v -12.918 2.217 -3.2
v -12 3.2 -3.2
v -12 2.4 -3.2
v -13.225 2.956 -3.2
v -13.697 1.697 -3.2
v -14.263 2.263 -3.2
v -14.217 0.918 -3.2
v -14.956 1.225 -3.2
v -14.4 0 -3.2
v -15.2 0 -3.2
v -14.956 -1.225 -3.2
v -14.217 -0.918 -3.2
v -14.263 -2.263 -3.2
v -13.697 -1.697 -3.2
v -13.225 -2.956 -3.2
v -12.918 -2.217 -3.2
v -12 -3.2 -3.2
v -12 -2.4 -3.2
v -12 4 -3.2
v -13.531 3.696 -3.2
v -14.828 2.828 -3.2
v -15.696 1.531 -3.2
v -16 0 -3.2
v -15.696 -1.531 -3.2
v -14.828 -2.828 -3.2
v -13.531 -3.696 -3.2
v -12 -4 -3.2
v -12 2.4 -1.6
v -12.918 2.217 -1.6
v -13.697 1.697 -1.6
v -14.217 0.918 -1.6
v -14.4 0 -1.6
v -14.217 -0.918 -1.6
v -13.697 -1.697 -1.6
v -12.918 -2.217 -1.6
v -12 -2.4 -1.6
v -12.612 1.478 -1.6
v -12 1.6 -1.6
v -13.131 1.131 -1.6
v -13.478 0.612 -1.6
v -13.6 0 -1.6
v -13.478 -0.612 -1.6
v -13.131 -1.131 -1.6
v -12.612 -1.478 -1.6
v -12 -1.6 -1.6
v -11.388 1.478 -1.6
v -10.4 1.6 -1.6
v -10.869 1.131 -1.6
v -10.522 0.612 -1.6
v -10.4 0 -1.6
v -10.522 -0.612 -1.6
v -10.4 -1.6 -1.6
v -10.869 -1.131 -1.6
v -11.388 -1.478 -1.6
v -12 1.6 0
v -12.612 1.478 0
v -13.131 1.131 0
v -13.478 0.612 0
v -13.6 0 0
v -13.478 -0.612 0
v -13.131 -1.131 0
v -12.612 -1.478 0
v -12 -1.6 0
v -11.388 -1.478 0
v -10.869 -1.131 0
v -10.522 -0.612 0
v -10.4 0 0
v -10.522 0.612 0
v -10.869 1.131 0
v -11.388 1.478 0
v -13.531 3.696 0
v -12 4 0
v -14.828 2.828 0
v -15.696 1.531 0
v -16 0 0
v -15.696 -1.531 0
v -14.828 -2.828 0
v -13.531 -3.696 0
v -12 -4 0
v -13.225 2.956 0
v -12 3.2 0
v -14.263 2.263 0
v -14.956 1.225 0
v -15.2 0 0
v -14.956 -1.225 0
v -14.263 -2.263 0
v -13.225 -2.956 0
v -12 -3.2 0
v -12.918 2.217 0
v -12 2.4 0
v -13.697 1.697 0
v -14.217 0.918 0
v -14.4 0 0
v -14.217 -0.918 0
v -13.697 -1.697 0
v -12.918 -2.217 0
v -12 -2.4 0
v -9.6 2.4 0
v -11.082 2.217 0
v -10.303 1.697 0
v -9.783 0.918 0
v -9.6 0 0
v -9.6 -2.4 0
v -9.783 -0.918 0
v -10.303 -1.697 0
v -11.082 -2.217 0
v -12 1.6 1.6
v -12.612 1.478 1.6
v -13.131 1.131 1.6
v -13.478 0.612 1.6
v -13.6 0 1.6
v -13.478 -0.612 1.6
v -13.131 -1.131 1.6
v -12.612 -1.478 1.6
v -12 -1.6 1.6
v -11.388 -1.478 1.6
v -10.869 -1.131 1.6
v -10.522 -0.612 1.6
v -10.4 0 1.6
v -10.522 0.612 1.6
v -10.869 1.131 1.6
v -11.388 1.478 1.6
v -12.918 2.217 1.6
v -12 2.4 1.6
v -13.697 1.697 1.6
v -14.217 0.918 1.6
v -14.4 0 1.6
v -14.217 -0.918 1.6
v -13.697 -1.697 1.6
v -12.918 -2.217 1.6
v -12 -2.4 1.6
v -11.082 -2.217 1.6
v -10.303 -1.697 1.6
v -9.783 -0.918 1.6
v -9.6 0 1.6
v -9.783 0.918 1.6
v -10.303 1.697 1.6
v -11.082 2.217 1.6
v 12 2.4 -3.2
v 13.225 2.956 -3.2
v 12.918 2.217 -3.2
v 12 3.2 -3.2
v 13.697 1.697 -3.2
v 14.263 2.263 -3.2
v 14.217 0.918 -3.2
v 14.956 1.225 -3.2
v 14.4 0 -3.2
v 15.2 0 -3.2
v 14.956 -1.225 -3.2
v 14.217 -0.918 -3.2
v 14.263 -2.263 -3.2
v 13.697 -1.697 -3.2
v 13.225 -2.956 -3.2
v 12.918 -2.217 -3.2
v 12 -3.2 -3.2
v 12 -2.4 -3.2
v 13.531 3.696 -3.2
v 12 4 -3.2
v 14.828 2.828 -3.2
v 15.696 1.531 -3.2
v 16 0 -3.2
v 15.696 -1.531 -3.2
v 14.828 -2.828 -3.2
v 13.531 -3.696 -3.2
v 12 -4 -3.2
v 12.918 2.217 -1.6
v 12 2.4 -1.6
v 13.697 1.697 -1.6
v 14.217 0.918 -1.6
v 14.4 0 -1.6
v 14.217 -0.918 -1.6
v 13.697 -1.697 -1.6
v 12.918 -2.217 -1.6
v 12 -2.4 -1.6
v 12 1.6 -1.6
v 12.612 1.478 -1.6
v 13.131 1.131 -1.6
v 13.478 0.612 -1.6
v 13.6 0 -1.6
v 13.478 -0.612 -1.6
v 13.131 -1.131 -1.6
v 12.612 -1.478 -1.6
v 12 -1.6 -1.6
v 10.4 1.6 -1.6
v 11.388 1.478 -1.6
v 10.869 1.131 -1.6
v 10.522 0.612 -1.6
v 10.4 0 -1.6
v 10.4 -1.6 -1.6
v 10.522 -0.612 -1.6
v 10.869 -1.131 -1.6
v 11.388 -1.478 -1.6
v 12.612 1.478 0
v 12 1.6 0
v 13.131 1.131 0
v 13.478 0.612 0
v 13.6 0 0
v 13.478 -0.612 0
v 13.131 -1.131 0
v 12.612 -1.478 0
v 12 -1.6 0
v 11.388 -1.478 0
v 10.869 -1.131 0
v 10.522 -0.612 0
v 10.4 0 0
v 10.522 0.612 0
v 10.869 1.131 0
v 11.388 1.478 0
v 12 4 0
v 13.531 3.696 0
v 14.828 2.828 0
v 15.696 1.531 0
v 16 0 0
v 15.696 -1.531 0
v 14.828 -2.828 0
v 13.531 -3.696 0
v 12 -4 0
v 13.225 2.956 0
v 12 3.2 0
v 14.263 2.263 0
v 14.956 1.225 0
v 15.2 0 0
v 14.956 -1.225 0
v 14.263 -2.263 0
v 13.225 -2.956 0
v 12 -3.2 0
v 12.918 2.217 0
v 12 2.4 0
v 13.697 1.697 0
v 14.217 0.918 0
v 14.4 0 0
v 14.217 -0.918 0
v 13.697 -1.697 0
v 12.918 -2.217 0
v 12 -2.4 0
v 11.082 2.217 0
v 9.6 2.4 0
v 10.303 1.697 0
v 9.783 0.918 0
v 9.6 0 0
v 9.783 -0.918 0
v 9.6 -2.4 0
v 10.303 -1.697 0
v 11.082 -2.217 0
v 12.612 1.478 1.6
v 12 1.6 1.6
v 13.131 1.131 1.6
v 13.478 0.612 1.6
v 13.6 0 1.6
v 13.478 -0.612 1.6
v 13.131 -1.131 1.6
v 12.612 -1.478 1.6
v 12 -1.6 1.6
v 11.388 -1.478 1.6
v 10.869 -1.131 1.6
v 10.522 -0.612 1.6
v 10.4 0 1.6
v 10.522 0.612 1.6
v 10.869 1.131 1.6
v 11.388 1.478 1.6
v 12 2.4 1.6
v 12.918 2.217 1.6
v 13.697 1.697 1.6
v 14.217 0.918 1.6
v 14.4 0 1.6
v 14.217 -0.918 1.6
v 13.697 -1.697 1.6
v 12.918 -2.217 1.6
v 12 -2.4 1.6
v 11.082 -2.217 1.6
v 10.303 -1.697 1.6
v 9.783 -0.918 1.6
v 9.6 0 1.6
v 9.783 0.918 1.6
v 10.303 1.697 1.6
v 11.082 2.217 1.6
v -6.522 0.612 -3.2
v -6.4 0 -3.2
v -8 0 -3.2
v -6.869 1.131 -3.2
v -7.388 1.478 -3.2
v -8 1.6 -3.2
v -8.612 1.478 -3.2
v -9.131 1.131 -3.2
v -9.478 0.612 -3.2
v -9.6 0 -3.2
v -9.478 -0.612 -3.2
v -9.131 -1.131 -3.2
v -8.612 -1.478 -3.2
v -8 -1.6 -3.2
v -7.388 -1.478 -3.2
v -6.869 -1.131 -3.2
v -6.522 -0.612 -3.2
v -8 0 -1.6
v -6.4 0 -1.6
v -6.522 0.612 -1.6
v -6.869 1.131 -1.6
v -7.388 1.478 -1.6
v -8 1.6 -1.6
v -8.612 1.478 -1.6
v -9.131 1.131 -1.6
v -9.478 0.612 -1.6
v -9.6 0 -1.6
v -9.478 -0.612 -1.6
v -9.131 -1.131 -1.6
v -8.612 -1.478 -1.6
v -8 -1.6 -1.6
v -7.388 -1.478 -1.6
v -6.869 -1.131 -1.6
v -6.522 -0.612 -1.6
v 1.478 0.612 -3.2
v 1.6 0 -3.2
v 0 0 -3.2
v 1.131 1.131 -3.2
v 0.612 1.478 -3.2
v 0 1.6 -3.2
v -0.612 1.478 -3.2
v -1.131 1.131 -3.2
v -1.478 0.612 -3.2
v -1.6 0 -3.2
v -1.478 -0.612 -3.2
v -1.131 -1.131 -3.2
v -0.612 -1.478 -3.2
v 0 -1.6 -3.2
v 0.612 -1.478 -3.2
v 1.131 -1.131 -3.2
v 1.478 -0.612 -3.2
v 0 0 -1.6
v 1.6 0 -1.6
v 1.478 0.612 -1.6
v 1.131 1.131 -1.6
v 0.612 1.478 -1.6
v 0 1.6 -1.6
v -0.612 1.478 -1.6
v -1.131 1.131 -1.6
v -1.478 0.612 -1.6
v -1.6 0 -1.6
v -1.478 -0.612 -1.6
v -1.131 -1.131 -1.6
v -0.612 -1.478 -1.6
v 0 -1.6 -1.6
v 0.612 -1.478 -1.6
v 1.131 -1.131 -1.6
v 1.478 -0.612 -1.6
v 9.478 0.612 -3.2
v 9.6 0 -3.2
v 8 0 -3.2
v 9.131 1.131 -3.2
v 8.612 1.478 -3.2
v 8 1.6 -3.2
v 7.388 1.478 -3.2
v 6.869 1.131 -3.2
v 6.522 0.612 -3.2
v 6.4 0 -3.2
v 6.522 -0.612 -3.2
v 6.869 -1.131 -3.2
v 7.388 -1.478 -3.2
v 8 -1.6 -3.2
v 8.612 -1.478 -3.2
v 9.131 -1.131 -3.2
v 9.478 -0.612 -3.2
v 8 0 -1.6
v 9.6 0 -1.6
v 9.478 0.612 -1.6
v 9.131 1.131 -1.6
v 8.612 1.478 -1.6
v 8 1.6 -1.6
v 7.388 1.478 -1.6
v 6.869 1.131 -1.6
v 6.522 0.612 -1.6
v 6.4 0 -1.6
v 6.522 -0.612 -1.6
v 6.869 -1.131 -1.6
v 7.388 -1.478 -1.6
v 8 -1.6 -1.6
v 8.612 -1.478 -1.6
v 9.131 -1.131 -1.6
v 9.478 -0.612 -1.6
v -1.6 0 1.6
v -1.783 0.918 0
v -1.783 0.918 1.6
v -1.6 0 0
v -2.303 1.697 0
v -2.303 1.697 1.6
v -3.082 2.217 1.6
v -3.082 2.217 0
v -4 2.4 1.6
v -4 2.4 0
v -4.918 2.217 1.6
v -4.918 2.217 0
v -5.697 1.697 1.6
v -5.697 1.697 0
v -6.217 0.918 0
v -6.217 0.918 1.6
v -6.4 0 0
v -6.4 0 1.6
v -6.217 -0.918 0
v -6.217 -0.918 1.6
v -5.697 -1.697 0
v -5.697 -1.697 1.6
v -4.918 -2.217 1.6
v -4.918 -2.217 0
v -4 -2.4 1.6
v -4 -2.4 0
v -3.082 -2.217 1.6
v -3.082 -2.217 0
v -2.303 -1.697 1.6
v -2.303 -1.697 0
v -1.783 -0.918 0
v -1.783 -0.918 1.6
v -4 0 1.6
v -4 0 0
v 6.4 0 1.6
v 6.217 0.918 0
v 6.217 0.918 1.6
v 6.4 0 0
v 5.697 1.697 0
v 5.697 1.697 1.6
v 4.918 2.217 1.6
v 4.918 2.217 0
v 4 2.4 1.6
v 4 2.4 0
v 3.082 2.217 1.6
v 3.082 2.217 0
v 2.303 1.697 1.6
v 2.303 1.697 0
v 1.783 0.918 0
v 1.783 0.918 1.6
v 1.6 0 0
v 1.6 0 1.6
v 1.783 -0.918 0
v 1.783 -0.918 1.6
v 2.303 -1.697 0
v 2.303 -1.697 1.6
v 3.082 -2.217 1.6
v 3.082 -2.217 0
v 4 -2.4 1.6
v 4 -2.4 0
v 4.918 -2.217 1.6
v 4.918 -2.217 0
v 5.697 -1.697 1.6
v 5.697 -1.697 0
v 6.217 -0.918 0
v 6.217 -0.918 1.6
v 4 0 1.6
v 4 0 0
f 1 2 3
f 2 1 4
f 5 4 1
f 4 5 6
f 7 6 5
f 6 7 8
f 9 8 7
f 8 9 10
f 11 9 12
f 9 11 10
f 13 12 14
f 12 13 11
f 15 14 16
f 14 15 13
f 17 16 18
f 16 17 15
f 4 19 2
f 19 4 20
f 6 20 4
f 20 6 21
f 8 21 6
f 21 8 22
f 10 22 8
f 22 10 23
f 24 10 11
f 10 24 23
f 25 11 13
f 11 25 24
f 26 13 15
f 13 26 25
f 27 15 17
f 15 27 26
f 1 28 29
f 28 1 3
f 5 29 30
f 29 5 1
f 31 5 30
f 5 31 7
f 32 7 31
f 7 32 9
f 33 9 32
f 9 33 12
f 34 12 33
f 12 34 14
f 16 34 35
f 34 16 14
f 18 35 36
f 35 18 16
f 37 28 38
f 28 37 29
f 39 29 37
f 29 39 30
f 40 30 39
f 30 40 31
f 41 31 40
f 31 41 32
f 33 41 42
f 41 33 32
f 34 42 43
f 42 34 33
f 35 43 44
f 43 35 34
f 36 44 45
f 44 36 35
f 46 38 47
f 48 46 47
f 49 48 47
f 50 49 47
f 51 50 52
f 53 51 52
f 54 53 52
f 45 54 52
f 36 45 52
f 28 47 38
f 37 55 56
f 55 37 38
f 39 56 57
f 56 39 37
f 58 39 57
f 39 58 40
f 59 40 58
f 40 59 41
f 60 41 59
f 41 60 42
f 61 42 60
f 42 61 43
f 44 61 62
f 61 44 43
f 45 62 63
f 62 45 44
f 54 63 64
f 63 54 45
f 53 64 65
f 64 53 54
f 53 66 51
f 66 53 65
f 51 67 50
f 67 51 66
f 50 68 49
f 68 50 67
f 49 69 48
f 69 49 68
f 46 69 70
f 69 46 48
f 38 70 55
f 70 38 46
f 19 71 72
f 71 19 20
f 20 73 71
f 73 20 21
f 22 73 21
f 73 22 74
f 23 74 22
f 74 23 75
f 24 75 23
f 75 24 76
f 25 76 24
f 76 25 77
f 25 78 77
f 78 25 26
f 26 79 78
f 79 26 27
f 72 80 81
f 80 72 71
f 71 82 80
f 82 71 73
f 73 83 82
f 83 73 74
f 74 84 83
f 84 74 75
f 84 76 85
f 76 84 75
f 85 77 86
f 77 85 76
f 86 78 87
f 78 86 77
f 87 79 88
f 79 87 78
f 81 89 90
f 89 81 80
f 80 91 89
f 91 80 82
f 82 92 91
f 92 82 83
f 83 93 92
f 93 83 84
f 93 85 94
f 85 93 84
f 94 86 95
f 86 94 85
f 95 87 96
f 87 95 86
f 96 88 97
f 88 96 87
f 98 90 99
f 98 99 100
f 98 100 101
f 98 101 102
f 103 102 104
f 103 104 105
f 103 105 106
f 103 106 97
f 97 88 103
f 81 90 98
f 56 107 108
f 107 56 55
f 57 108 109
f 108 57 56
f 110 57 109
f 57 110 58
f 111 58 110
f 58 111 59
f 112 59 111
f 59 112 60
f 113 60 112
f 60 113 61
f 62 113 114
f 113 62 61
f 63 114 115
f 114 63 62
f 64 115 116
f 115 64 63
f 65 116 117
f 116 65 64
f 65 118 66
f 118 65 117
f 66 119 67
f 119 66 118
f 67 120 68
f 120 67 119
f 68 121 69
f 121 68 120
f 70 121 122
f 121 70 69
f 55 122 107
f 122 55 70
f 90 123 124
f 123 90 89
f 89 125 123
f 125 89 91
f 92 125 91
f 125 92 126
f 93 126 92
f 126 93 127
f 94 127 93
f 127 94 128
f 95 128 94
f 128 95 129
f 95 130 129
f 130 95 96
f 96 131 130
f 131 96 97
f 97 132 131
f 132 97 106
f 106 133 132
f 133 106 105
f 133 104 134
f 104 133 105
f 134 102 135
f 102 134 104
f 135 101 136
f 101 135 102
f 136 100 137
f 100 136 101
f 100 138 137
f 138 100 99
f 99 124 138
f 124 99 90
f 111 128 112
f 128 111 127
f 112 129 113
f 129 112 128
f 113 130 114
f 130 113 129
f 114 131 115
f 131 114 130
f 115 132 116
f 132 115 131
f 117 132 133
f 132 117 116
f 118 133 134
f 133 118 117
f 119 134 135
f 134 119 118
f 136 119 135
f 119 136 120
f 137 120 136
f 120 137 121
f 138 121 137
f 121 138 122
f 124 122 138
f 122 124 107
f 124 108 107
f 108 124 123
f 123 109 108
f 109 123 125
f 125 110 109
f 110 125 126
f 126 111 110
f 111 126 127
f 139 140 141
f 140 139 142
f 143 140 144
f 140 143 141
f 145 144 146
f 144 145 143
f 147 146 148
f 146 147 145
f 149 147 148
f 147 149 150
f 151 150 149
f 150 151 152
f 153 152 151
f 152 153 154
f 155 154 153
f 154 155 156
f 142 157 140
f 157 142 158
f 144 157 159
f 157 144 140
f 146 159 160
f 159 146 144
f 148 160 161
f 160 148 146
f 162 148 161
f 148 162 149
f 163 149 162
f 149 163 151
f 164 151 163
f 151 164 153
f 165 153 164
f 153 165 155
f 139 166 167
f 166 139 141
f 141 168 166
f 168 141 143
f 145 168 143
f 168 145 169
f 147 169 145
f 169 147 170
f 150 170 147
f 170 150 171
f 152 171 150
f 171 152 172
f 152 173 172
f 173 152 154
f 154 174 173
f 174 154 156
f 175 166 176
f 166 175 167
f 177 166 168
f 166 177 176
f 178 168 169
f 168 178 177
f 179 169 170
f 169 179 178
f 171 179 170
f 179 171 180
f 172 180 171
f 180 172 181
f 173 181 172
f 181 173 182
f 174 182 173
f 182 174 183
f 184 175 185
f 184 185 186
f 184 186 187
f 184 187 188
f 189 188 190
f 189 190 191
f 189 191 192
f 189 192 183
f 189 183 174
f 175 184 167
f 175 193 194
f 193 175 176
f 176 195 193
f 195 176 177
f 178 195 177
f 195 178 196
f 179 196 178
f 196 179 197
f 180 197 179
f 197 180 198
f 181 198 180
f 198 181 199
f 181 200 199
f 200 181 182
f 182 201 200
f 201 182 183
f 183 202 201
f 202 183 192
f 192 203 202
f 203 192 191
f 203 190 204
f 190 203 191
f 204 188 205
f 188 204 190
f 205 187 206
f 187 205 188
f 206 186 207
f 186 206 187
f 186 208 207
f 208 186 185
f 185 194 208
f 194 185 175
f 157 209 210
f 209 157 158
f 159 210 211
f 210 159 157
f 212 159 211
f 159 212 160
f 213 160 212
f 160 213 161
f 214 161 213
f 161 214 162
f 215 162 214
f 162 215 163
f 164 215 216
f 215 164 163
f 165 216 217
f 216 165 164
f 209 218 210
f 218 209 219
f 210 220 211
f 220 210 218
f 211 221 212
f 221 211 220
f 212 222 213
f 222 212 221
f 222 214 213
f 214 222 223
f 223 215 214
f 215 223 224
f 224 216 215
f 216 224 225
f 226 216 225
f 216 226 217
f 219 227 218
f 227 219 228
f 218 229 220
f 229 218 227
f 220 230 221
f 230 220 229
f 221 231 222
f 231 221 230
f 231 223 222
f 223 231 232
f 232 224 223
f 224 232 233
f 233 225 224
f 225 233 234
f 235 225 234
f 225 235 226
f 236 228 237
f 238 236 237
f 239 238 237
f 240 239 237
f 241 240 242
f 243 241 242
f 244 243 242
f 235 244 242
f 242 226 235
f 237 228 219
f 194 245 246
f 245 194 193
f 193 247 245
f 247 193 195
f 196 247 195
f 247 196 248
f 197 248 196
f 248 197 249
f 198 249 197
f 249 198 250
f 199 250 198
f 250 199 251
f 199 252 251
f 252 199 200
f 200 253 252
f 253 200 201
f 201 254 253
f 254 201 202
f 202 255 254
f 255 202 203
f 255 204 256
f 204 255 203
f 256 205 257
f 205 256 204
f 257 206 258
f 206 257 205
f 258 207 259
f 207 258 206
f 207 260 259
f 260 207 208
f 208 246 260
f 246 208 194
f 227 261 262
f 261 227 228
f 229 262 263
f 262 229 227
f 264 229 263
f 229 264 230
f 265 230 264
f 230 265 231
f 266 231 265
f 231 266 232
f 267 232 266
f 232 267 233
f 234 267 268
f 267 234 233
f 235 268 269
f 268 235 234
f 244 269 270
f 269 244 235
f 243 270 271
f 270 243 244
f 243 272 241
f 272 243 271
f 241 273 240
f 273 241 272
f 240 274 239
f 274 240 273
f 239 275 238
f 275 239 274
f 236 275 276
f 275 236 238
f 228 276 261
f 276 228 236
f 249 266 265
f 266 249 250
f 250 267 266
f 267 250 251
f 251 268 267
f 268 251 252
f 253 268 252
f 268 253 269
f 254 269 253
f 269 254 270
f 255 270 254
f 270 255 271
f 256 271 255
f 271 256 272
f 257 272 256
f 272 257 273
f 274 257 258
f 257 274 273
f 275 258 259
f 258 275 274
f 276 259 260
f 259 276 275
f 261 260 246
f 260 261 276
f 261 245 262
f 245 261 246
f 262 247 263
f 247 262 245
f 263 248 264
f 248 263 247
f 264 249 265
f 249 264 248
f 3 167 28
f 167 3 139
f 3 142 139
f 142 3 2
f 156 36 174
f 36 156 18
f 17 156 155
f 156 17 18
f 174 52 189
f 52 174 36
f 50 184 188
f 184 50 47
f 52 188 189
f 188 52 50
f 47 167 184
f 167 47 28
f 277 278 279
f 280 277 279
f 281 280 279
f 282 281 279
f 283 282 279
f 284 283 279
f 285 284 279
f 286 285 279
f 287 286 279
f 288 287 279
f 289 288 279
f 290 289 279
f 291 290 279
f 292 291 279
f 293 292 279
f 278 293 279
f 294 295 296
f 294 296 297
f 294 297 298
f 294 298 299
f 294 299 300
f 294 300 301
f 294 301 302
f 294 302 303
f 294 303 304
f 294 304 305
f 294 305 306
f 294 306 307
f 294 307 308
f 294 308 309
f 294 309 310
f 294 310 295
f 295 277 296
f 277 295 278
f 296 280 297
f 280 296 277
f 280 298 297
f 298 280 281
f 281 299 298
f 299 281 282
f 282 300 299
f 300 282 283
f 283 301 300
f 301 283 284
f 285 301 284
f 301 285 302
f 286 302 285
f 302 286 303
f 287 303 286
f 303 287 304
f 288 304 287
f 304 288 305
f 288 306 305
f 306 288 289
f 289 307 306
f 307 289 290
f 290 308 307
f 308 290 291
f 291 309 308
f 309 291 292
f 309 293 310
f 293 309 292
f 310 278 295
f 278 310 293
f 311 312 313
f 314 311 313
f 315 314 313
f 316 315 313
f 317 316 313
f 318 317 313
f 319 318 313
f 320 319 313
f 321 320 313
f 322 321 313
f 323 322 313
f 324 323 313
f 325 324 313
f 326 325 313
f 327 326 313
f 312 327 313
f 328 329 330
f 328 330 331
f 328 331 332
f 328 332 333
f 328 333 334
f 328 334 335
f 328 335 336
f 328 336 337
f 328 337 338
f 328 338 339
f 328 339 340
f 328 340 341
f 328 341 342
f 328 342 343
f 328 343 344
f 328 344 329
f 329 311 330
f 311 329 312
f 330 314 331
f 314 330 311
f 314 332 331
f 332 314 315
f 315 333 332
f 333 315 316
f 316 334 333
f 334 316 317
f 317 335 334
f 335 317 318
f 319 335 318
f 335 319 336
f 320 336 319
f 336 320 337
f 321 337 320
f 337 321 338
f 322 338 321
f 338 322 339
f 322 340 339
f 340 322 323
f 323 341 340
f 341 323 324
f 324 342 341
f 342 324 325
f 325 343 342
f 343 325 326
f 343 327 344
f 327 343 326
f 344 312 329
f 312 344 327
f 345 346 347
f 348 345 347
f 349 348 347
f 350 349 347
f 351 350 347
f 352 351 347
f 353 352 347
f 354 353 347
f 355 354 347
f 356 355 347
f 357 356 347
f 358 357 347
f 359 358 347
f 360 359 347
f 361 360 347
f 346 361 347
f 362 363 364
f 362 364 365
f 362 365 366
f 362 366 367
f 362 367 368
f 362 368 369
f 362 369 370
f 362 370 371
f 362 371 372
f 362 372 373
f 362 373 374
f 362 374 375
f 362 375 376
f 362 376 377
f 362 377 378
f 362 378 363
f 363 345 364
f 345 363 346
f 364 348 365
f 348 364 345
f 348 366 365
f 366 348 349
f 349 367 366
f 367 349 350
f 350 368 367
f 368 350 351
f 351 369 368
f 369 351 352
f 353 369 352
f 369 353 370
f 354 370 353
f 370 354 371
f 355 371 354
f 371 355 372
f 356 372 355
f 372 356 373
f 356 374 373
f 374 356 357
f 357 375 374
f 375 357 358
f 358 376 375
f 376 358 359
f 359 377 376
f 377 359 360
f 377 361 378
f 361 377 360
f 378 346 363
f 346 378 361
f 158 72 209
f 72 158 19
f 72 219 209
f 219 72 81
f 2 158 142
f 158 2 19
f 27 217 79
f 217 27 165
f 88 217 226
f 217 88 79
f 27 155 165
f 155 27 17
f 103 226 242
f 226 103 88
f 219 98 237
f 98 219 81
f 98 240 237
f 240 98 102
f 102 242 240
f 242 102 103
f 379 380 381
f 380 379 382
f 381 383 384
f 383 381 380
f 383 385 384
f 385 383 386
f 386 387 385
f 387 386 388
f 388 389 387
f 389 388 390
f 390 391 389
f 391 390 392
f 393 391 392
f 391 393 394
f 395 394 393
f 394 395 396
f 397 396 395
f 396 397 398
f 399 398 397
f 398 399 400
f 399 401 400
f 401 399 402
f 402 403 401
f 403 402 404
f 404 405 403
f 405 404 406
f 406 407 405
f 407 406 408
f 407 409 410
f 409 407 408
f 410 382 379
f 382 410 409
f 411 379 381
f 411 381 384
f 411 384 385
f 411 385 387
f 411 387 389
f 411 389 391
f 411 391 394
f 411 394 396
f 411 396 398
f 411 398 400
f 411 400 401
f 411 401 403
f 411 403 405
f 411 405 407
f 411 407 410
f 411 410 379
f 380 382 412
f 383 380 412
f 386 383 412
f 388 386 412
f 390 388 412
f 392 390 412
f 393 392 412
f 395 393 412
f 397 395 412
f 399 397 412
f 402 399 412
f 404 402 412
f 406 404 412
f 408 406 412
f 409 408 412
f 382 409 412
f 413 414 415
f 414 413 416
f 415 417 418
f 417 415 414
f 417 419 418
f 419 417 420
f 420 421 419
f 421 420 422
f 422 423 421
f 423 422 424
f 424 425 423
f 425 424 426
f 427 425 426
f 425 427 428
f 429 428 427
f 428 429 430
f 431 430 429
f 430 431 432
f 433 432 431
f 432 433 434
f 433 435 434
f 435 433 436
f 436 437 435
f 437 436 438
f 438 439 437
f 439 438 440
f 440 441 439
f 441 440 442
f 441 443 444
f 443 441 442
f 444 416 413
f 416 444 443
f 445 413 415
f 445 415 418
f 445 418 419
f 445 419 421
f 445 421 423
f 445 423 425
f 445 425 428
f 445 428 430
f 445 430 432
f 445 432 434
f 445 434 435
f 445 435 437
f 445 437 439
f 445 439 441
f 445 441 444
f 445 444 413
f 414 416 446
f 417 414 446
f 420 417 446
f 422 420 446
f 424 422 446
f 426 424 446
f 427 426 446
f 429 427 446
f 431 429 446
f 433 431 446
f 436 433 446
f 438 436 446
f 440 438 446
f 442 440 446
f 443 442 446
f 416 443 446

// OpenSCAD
use <../lib.scad>
use <../p/box2-11.scad>
use <../p/box3u10p.scad>
use <s/77850s01.scad>
use <../p/stug-1x2.scad>
use <../p/stug3-1x3.scad>
function ldraw_lib__77845() = [
// 0 Plate  1 x  4 Round Ends with  2 Open Studs on Ends
// 0 Name: 77845.dat
// 0 Author: Gerald Lasser [GeraldLasser]
// 0 !LDRAW_ORG Part UPDATE 2023-05
// 0 !LICENSE Licensed under CC BY 4.0 : see CAreadme.txt
// 
// 0 BFC CERTIFY CCW
  [0,"BFC","CERTIFY"],
  [0,"BFC","CCW"],
// 
// 0 !HISTORY 2023-10-31 [OrionP] Official Update 2023-05
// 
// 
// 1 16 -30 0 0 1 0 0 0 1 0 0 0 1 s\77850s01.dat
  [1,16,-30,0,0,1,0,0,0,1,0,0,0,1, ldraw_lib__s__77850s01()],
// 1 16 30 0 0 -1 0 0 0 1 0 0 0 1 s\77850s01.dat
  [1,16,30,0,0,-1,0,0,0,1,0,0,0,1, ldraw_lib__s__77850s01()],
// 
// 0 // Bottom
// 1 16 0 6 7 30 0 0 0 0 2 0 -1 0 box2-11.dat
  [1,16,0,6,7,30,0,0,0,0,2,0,-1,0, ldraw_lib__box2_11()],
// 1 16 0 6 -7 -30 0 0 0 0 2 0 1 0 box2-11.dat
  [1,16,0,6,-7,-30,0,0,0,0,2,0,1,0, ldraw_lib__box2_11()],
// 2 24 30 4 -6 -30 4 -6
  [2,24,30,4,-6,-30,4,-6],
// 2 24 -30 4 6 30 4 6
  [2,24,-30,4,6,30,4,6],
// 
// 4 16 26 4 -4 30 4 -6 -30 4 -6 -26 4 -4
  [4,16,26,4,-4,30,4,-6,-30,4,-6,-26,4,-4],
// 4 16 -26 4 4 26 4 4 26 4 0 -26 4 0
  [4,16,-26,4,4,26,4,4,26,4,0,-26,4,0],
// 4 16 -26 4 -4 -26 4 0 26 4 0 26 4 -4
  [4,16,-26,4,-4,-26,4,0,26,4,0,26,4,-4],
// 4 16 26 4 4 -26 4 4 -30 4 6 30 4 6
  [4,16,26,4,4,-26,4,4,-30,4,6,30,4,6],
// 1 16 0 4 0 1 0 0 0 -1 0 0 0 1 stug3-1x3.dat
  [1,16,0,4,0,1,0,0,0,-1,0,0,0,1, ldraw_lib__stug3_1x3()],
// 
// 1 16 0 4 8 30 0 0 0 0 -4 0 2 0 box3u10p.dat
  [1,16,0,4,8,30,0,0,0,0,-4,0,2,0, ldraw_lib__box3u10p()],
// 1 16 0 4 -8 -30 0 0 0 0 -4 0 -2 0 box3u10p.dat
  [1,16,0,4,-8,-30,0,0,0,0,-4,0,-2,0, ldraw_lib__box3u10p()],
// 
// 0 // Top
// 4 16 -30 0 -8 30 0 -8 24 0 -6 -24 0 -6
  [4,16,-30,0,-8,30,0,-8,24,0,-6,-24,0,-6],
// 4 16 24 0 6 30 0 8 -30 0 8 -24 0 6
  [4,16,24,0,6,30,0,8,-30,0,8,-24,0,6],
// 4 16 -24 0 6 -24 0 0 24 0 0 24 0 6
  [4,16,-24,0,6,-24,0,0,24,0,0,24,0,6],
// 4 16 -24 0 0 -24 0 -6 24 0 -6 24 0 0
  [4,16,-24,0,0,-24,0,-6,24,0,-6,24,0,0],
// 1 16 0 0 0 1 0 0 0 1 0 0 0 1 stug-1x2.dat
  [1,16,0,0,0,1,0,0,0,1,0,0,0,1, ldraw_lib__stug_1x2()],
];
module ldraw_lib__77845(step=0, col=false, unit=2/5, alt=false, line=0.2, solid=!$preview)
    makepoly(ldraw_lib__77845(), step=step, col=col, unit=unit, alt=alt, line=line, solid=solid);
ldraw_lib__77845(line=0.2);
